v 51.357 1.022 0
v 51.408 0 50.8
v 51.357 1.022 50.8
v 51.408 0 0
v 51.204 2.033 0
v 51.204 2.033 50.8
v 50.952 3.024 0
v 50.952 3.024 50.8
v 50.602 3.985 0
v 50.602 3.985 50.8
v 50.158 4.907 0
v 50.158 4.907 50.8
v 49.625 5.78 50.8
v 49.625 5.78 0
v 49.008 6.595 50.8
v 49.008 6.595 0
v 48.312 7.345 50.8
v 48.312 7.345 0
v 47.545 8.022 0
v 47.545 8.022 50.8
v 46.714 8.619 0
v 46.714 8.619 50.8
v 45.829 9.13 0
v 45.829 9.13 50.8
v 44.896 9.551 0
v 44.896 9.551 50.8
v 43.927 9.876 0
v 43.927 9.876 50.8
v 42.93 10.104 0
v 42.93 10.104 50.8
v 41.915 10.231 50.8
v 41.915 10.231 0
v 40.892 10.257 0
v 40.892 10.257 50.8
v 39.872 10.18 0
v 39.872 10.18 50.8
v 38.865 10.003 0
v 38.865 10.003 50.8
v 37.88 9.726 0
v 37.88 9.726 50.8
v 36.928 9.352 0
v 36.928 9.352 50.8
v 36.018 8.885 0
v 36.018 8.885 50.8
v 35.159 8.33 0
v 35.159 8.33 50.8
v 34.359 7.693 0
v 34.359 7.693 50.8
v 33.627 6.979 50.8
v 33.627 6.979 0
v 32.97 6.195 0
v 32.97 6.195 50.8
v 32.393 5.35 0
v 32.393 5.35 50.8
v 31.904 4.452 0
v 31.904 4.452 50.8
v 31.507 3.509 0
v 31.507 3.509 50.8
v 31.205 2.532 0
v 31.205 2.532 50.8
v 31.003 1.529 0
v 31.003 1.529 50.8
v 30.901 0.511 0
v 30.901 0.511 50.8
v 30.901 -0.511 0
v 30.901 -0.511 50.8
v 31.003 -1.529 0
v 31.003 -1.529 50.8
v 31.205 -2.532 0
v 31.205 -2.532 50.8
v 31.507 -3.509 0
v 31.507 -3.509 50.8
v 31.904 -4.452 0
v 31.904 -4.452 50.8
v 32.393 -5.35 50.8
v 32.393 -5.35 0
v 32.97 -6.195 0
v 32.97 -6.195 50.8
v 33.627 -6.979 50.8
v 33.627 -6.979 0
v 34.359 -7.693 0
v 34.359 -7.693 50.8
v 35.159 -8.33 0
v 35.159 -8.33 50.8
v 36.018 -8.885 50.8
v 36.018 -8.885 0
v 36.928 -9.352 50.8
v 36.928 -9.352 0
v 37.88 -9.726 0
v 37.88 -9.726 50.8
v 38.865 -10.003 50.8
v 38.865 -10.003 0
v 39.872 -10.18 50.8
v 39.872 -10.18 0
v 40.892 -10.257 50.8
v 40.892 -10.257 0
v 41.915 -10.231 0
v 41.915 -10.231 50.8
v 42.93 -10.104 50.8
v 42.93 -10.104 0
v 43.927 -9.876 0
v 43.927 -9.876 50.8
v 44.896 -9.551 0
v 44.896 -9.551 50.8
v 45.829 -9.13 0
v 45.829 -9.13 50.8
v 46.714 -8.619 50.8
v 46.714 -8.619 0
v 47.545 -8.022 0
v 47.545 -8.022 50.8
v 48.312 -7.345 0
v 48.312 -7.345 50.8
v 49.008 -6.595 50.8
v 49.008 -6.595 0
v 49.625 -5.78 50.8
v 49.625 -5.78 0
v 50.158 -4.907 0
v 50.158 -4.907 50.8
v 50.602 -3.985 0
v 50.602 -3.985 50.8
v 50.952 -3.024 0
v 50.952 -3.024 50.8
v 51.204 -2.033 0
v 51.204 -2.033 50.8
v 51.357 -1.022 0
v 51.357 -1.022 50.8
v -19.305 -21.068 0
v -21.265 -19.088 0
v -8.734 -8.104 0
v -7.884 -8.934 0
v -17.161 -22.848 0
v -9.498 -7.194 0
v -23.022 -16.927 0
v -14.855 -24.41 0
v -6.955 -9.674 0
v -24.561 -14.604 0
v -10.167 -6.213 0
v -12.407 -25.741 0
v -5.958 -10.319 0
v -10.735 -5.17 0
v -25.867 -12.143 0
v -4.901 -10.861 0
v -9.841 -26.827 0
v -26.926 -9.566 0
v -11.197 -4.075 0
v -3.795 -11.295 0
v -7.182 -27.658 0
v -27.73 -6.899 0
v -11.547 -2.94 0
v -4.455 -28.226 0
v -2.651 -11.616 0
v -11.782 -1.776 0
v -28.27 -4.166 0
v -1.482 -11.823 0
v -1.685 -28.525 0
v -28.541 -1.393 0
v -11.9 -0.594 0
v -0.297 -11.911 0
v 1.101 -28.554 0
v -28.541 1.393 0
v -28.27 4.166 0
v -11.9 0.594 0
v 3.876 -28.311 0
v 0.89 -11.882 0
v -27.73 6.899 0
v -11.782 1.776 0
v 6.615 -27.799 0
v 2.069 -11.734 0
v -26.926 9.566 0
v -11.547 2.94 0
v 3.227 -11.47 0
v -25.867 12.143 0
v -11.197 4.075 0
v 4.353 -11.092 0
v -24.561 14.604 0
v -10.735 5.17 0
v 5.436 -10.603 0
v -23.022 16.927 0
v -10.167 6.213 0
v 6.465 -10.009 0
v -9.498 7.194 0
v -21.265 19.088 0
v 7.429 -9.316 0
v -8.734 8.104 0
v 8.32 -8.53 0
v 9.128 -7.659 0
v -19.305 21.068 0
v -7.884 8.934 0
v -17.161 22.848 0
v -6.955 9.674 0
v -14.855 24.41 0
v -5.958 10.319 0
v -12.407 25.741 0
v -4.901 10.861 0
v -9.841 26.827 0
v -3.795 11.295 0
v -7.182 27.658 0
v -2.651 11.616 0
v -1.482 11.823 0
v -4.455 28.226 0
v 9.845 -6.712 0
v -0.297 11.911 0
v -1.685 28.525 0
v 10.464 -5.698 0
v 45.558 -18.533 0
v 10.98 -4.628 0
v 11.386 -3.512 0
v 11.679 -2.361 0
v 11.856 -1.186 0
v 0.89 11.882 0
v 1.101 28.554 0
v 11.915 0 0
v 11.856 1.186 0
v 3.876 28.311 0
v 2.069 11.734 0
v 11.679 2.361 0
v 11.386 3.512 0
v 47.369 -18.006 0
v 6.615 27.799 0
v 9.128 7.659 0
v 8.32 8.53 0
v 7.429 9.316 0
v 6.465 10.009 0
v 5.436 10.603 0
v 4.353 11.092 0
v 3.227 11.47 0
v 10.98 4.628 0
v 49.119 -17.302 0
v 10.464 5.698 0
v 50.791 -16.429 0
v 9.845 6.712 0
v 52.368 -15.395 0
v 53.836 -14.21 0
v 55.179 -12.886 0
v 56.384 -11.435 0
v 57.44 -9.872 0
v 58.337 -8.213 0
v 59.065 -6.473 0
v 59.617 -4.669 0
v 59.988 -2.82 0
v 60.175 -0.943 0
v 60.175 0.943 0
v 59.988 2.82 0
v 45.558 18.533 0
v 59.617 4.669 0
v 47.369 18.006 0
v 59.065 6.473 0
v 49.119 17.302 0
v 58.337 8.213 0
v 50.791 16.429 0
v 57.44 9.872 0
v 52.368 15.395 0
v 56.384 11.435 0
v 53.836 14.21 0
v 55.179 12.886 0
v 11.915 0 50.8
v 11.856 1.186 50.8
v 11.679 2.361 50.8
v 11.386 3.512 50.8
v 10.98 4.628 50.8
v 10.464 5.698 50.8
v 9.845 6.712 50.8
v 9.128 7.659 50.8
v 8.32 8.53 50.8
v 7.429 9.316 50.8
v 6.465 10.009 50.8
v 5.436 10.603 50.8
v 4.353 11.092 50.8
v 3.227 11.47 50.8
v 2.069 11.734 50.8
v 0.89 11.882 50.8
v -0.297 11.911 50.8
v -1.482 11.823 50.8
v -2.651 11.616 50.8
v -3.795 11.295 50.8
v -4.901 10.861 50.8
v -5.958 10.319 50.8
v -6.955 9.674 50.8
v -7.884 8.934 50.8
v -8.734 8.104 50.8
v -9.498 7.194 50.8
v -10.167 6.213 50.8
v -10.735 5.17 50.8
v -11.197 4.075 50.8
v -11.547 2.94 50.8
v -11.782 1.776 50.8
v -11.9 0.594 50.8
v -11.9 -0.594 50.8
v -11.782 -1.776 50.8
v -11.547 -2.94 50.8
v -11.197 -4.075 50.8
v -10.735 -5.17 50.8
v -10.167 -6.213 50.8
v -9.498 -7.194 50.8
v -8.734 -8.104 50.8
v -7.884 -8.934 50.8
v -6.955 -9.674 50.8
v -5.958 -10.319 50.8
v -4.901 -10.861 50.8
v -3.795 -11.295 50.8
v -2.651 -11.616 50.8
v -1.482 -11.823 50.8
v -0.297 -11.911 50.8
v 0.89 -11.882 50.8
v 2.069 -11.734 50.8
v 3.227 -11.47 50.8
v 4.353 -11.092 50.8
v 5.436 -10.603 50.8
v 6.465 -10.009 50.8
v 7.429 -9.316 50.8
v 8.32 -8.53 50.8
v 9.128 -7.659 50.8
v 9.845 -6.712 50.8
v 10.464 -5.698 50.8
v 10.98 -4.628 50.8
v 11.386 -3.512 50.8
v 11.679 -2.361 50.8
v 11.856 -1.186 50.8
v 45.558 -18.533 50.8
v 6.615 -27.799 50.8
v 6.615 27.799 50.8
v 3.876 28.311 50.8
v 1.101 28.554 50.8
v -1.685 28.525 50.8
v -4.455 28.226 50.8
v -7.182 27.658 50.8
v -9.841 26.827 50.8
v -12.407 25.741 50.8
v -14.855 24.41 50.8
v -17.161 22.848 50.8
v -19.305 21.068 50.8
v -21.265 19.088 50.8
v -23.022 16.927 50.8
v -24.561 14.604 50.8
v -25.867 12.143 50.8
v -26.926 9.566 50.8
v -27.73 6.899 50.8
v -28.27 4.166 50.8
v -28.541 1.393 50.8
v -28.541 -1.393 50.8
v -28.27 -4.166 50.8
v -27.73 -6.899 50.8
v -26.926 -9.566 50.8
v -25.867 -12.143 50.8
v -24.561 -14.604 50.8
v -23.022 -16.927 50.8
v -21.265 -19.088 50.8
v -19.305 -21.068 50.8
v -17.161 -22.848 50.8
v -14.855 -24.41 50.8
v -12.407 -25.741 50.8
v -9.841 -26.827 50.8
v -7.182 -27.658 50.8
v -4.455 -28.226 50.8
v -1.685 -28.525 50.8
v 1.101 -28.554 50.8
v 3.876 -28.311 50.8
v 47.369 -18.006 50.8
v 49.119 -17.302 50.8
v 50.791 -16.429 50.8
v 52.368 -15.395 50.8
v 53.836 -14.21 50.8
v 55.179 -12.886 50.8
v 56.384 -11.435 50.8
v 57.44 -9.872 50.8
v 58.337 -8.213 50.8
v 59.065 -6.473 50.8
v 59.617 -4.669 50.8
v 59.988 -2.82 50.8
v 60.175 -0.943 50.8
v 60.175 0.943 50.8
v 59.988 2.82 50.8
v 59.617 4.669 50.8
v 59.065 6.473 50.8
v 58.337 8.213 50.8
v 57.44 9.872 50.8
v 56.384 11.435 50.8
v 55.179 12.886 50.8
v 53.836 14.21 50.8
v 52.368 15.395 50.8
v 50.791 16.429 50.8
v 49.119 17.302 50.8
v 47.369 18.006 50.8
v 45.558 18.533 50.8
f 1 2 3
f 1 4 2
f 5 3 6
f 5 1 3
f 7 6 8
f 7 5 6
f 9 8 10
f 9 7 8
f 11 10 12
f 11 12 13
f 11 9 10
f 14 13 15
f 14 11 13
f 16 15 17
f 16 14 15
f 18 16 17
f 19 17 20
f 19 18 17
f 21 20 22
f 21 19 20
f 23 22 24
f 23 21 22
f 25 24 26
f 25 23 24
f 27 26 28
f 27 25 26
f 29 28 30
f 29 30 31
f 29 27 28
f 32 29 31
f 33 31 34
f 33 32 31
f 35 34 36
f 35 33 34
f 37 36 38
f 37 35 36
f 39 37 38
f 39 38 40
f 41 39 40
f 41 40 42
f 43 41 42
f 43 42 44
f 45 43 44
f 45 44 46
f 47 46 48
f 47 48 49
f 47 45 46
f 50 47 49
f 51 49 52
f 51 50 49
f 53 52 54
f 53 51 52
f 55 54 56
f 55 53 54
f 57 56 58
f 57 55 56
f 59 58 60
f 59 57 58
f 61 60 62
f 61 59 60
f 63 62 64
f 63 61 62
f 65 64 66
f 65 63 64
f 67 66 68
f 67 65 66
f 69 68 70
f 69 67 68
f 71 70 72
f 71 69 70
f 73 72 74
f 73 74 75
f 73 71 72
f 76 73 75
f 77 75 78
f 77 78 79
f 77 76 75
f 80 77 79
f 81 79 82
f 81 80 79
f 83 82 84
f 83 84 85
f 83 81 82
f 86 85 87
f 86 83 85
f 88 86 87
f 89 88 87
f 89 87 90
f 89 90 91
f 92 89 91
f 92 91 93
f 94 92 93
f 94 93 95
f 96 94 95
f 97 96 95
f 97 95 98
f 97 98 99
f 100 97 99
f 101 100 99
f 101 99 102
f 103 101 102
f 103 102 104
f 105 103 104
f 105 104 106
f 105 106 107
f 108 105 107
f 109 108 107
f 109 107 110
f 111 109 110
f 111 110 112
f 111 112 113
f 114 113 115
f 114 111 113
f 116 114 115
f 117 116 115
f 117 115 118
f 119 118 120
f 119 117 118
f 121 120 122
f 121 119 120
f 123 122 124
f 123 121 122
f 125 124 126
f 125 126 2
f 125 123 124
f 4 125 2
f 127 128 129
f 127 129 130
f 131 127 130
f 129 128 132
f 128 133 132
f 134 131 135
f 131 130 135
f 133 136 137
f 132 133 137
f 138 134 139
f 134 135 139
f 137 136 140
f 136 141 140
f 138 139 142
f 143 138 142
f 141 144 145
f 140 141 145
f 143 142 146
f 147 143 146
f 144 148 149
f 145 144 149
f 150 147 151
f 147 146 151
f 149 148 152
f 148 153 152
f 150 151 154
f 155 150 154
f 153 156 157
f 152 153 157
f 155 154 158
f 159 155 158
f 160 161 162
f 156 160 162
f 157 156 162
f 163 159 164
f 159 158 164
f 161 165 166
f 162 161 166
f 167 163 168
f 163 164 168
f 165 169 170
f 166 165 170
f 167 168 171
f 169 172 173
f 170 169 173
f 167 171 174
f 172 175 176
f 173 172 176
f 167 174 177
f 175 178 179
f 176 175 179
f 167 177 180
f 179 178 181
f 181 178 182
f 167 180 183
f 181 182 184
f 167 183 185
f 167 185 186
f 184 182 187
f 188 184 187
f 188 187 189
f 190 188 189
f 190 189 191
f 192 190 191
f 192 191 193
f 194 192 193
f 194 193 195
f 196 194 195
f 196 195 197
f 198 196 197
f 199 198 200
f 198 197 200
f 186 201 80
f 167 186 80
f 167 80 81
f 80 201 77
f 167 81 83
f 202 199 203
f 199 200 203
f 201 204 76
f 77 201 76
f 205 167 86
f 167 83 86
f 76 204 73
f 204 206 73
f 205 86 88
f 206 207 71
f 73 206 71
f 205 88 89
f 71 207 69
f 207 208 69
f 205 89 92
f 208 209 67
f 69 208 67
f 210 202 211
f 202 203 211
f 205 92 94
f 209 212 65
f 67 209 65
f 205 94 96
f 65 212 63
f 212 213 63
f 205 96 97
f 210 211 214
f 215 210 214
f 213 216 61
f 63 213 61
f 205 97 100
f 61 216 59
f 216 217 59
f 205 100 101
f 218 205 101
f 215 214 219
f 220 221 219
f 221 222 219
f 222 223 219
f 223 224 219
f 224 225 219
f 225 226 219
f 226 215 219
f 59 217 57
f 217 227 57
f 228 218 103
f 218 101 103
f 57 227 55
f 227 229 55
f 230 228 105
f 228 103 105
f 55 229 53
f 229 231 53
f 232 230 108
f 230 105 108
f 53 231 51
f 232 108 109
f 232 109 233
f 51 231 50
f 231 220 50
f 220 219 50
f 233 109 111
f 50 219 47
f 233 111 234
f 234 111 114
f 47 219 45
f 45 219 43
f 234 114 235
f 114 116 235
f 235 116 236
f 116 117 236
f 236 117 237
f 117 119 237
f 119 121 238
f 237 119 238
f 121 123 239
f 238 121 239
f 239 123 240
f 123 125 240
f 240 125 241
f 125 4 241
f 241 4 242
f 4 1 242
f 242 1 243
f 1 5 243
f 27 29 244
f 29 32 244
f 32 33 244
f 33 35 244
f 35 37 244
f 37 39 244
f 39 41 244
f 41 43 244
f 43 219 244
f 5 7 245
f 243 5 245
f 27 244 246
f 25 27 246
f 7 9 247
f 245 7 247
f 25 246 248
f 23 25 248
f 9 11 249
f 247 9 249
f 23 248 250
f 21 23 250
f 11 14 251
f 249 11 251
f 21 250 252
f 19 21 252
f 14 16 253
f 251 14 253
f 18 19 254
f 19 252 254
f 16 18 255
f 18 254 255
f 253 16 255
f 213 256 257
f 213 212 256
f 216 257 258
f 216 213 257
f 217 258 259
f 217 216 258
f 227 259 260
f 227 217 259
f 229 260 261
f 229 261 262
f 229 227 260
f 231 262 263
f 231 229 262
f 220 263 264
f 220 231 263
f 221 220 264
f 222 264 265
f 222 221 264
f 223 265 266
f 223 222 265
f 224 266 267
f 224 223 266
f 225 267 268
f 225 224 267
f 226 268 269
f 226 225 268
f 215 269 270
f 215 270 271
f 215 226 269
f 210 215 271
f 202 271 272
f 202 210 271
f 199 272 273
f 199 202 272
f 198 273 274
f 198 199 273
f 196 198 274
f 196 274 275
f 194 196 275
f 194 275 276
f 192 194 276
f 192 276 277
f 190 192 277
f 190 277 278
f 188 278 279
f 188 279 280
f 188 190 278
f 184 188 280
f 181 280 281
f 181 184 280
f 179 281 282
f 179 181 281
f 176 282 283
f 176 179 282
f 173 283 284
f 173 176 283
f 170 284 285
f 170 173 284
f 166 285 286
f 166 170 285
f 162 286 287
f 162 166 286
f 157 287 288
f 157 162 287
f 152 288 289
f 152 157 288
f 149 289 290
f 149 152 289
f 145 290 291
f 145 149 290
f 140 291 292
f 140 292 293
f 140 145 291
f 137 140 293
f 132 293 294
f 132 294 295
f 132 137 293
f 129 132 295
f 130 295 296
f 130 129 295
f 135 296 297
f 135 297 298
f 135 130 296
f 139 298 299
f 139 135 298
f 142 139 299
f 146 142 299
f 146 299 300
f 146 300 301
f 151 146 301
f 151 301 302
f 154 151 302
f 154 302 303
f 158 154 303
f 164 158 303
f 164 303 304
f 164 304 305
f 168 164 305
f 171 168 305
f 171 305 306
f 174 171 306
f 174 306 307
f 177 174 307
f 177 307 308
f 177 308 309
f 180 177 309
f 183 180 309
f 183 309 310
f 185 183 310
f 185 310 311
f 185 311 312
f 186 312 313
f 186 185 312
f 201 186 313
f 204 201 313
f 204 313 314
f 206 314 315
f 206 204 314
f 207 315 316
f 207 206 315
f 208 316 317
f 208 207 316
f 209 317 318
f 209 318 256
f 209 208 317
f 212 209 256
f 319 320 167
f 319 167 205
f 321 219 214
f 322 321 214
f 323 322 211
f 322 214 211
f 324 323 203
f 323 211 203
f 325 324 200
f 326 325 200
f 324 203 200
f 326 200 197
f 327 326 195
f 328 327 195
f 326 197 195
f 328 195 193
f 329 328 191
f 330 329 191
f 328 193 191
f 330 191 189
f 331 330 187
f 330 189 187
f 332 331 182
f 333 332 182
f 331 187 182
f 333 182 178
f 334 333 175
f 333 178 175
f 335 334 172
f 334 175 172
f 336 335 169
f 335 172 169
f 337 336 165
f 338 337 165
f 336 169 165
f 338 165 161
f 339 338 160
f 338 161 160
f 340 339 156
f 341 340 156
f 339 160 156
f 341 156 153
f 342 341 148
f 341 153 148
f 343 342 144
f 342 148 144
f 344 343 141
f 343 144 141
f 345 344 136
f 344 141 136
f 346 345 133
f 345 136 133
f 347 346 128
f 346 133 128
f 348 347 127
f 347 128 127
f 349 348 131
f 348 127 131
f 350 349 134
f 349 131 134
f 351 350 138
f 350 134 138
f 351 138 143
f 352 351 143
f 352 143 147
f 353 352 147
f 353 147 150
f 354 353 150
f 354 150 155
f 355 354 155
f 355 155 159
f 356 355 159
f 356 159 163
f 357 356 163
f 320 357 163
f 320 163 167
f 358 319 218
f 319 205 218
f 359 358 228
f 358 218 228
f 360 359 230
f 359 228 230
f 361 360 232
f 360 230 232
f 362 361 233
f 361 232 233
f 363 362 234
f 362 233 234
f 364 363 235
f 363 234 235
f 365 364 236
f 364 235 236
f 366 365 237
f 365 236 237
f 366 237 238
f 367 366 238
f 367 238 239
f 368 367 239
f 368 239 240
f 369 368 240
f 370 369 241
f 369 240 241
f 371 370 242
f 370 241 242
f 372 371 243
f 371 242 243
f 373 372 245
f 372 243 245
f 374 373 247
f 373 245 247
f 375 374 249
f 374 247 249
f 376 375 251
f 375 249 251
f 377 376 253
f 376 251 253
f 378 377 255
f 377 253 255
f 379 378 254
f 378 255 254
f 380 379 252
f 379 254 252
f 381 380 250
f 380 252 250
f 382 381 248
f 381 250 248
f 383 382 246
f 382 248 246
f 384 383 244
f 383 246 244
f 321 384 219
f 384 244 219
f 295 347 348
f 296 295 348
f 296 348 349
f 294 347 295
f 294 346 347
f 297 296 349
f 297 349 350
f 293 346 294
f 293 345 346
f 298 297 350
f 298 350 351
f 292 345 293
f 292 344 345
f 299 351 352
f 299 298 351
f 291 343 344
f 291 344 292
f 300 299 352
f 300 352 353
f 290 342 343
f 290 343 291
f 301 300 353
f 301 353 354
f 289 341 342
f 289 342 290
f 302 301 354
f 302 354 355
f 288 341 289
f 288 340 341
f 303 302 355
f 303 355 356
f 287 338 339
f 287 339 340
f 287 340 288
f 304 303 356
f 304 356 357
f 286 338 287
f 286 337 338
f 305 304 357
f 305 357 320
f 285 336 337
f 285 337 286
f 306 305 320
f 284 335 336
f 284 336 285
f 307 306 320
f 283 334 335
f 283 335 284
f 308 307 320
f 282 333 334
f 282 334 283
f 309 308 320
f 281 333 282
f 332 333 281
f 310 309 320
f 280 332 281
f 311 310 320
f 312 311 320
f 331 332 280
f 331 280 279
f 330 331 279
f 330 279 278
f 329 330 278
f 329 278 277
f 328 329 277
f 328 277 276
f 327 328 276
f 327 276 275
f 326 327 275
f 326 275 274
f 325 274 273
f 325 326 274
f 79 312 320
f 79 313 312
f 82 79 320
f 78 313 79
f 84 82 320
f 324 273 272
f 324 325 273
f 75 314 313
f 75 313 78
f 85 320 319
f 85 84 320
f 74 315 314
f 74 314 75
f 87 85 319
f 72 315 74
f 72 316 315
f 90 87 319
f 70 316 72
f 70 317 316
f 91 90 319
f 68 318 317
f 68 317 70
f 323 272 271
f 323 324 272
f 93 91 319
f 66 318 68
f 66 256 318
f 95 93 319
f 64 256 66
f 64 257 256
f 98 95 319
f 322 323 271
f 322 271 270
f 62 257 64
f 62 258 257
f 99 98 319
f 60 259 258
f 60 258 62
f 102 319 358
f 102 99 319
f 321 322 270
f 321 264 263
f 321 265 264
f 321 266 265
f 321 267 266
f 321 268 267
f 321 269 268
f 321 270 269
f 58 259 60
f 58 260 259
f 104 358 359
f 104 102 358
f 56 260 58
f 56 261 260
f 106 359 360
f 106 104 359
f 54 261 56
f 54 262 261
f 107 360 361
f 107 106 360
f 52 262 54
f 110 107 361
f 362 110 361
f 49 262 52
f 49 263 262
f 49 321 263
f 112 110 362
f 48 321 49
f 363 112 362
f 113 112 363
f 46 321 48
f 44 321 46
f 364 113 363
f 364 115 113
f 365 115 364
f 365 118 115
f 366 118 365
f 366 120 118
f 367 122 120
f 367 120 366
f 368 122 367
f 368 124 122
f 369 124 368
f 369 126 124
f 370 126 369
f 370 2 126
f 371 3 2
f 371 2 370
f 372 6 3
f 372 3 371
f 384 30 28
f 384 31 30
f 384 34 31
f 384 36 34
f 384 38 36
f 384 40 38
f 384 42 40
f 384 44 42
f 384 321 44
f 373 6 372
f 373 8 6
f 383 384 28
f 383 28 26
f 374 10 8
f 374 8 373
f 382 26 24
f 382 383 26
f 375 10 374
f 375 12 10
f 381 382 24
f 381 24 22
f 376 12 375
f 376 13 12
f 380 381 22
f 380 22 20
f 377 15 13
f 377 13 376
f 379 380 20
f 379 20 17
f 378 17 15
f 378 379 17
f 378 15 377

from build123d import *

# Parameters (mm, degrees)
F0_R        = 11.915187
F0_R_2      = 10.259899
F1_DEPTH    = 25.4
F1_FACE_R   = 11.915187
F1_FACE_R_2 = 10.259899
F2_DEPTH    = 12.7
F3_DEPTH    = 25.4


with BuildPart() as f1:
    # F0 (on Top) → F1 (new body)
    with BuildSketch(Plane.XY):
        with BuildLine():
            Line((45.557722, 18.532589), (6.614583, 27.798883))
            ThreePointArc((6.614583, 27.798883), (-28.575, 0), (6.614583, -27.798883))
            Line((6.614583, -27.798883), (45.557722, -18.532589))
            ThreePointArc((45.557722, -18.532589), (60.198, 0), (45.557722, 18.532589))
        make_face()
        Circle(F0_R, mode=Mode.SUBTRACT)
        with Locations((41.148, 0)):
            Circle(F0_R_2, mode=Mode.SUBTRACT)
    extrude(amount=F1_DEPTH)

    # F1_face (on face) → F2 (join)
    with BuildSketch(Plane(origin=(12.189133, 0, 25.4), x_dir=(1, 0, 0), z_dir=(0, 0, 1))):
        with BuildLine():
            Line((-5.57455, -27.798883), (33.368589, -18.532589))
            ThreePointArc((33.368589, -18.532589), (48.008867, 0), (33.368589, 18.532589))
            Line((33.368589, 18.532589), (-5.57455, 27.798883))
            ThreePointArc((-5.57455, 27.798883), (-40.764133, 0), (-5.57455, -27.798883))
        make_face()
        with Locations((-12.189133, 0)):
            Circle(F1_FACE_R, mode=Mode.SUBTRACT)
        with Locations((28.958867, 0)):
            Circle(F1_FACE_R_2, mode=Mode.SUBTRACT)
    extrude(amount=-F2_DEPTH)

    # F1_face (on face) → F3 (join)
    with BuildSketch(Plane(origin=(12.189133, 0, 25.4), x_dir=(1, 0, 0), z_dir=(0, 0, 1))):
        with BuildLine():
            Line((-5.57455, -27.798883), (33.368589, -18.532589))
            ThreePointArc((33.368589, -18.532589), (48.008867, 0), (33.368589, 18.532589))
            Line((33.368589, 18.532589), (-5.57455, 27.798883))
            ThreePointArc((-5.57455, 27.798883), (-40.764133, 0), (-5.57455, -27.798883))
        make_face()
        with Locations((-12.189133, 0)):
            Circle(F1_FACE_R, mode=Mode.SUBTRACT)
        with Locations((28.958867, 0)):
            Circle(F1_FACE_R_2, mode=Mode.SUBTRACT)
    extrude(amount=F3_DEPTH)


solid = f1.part
